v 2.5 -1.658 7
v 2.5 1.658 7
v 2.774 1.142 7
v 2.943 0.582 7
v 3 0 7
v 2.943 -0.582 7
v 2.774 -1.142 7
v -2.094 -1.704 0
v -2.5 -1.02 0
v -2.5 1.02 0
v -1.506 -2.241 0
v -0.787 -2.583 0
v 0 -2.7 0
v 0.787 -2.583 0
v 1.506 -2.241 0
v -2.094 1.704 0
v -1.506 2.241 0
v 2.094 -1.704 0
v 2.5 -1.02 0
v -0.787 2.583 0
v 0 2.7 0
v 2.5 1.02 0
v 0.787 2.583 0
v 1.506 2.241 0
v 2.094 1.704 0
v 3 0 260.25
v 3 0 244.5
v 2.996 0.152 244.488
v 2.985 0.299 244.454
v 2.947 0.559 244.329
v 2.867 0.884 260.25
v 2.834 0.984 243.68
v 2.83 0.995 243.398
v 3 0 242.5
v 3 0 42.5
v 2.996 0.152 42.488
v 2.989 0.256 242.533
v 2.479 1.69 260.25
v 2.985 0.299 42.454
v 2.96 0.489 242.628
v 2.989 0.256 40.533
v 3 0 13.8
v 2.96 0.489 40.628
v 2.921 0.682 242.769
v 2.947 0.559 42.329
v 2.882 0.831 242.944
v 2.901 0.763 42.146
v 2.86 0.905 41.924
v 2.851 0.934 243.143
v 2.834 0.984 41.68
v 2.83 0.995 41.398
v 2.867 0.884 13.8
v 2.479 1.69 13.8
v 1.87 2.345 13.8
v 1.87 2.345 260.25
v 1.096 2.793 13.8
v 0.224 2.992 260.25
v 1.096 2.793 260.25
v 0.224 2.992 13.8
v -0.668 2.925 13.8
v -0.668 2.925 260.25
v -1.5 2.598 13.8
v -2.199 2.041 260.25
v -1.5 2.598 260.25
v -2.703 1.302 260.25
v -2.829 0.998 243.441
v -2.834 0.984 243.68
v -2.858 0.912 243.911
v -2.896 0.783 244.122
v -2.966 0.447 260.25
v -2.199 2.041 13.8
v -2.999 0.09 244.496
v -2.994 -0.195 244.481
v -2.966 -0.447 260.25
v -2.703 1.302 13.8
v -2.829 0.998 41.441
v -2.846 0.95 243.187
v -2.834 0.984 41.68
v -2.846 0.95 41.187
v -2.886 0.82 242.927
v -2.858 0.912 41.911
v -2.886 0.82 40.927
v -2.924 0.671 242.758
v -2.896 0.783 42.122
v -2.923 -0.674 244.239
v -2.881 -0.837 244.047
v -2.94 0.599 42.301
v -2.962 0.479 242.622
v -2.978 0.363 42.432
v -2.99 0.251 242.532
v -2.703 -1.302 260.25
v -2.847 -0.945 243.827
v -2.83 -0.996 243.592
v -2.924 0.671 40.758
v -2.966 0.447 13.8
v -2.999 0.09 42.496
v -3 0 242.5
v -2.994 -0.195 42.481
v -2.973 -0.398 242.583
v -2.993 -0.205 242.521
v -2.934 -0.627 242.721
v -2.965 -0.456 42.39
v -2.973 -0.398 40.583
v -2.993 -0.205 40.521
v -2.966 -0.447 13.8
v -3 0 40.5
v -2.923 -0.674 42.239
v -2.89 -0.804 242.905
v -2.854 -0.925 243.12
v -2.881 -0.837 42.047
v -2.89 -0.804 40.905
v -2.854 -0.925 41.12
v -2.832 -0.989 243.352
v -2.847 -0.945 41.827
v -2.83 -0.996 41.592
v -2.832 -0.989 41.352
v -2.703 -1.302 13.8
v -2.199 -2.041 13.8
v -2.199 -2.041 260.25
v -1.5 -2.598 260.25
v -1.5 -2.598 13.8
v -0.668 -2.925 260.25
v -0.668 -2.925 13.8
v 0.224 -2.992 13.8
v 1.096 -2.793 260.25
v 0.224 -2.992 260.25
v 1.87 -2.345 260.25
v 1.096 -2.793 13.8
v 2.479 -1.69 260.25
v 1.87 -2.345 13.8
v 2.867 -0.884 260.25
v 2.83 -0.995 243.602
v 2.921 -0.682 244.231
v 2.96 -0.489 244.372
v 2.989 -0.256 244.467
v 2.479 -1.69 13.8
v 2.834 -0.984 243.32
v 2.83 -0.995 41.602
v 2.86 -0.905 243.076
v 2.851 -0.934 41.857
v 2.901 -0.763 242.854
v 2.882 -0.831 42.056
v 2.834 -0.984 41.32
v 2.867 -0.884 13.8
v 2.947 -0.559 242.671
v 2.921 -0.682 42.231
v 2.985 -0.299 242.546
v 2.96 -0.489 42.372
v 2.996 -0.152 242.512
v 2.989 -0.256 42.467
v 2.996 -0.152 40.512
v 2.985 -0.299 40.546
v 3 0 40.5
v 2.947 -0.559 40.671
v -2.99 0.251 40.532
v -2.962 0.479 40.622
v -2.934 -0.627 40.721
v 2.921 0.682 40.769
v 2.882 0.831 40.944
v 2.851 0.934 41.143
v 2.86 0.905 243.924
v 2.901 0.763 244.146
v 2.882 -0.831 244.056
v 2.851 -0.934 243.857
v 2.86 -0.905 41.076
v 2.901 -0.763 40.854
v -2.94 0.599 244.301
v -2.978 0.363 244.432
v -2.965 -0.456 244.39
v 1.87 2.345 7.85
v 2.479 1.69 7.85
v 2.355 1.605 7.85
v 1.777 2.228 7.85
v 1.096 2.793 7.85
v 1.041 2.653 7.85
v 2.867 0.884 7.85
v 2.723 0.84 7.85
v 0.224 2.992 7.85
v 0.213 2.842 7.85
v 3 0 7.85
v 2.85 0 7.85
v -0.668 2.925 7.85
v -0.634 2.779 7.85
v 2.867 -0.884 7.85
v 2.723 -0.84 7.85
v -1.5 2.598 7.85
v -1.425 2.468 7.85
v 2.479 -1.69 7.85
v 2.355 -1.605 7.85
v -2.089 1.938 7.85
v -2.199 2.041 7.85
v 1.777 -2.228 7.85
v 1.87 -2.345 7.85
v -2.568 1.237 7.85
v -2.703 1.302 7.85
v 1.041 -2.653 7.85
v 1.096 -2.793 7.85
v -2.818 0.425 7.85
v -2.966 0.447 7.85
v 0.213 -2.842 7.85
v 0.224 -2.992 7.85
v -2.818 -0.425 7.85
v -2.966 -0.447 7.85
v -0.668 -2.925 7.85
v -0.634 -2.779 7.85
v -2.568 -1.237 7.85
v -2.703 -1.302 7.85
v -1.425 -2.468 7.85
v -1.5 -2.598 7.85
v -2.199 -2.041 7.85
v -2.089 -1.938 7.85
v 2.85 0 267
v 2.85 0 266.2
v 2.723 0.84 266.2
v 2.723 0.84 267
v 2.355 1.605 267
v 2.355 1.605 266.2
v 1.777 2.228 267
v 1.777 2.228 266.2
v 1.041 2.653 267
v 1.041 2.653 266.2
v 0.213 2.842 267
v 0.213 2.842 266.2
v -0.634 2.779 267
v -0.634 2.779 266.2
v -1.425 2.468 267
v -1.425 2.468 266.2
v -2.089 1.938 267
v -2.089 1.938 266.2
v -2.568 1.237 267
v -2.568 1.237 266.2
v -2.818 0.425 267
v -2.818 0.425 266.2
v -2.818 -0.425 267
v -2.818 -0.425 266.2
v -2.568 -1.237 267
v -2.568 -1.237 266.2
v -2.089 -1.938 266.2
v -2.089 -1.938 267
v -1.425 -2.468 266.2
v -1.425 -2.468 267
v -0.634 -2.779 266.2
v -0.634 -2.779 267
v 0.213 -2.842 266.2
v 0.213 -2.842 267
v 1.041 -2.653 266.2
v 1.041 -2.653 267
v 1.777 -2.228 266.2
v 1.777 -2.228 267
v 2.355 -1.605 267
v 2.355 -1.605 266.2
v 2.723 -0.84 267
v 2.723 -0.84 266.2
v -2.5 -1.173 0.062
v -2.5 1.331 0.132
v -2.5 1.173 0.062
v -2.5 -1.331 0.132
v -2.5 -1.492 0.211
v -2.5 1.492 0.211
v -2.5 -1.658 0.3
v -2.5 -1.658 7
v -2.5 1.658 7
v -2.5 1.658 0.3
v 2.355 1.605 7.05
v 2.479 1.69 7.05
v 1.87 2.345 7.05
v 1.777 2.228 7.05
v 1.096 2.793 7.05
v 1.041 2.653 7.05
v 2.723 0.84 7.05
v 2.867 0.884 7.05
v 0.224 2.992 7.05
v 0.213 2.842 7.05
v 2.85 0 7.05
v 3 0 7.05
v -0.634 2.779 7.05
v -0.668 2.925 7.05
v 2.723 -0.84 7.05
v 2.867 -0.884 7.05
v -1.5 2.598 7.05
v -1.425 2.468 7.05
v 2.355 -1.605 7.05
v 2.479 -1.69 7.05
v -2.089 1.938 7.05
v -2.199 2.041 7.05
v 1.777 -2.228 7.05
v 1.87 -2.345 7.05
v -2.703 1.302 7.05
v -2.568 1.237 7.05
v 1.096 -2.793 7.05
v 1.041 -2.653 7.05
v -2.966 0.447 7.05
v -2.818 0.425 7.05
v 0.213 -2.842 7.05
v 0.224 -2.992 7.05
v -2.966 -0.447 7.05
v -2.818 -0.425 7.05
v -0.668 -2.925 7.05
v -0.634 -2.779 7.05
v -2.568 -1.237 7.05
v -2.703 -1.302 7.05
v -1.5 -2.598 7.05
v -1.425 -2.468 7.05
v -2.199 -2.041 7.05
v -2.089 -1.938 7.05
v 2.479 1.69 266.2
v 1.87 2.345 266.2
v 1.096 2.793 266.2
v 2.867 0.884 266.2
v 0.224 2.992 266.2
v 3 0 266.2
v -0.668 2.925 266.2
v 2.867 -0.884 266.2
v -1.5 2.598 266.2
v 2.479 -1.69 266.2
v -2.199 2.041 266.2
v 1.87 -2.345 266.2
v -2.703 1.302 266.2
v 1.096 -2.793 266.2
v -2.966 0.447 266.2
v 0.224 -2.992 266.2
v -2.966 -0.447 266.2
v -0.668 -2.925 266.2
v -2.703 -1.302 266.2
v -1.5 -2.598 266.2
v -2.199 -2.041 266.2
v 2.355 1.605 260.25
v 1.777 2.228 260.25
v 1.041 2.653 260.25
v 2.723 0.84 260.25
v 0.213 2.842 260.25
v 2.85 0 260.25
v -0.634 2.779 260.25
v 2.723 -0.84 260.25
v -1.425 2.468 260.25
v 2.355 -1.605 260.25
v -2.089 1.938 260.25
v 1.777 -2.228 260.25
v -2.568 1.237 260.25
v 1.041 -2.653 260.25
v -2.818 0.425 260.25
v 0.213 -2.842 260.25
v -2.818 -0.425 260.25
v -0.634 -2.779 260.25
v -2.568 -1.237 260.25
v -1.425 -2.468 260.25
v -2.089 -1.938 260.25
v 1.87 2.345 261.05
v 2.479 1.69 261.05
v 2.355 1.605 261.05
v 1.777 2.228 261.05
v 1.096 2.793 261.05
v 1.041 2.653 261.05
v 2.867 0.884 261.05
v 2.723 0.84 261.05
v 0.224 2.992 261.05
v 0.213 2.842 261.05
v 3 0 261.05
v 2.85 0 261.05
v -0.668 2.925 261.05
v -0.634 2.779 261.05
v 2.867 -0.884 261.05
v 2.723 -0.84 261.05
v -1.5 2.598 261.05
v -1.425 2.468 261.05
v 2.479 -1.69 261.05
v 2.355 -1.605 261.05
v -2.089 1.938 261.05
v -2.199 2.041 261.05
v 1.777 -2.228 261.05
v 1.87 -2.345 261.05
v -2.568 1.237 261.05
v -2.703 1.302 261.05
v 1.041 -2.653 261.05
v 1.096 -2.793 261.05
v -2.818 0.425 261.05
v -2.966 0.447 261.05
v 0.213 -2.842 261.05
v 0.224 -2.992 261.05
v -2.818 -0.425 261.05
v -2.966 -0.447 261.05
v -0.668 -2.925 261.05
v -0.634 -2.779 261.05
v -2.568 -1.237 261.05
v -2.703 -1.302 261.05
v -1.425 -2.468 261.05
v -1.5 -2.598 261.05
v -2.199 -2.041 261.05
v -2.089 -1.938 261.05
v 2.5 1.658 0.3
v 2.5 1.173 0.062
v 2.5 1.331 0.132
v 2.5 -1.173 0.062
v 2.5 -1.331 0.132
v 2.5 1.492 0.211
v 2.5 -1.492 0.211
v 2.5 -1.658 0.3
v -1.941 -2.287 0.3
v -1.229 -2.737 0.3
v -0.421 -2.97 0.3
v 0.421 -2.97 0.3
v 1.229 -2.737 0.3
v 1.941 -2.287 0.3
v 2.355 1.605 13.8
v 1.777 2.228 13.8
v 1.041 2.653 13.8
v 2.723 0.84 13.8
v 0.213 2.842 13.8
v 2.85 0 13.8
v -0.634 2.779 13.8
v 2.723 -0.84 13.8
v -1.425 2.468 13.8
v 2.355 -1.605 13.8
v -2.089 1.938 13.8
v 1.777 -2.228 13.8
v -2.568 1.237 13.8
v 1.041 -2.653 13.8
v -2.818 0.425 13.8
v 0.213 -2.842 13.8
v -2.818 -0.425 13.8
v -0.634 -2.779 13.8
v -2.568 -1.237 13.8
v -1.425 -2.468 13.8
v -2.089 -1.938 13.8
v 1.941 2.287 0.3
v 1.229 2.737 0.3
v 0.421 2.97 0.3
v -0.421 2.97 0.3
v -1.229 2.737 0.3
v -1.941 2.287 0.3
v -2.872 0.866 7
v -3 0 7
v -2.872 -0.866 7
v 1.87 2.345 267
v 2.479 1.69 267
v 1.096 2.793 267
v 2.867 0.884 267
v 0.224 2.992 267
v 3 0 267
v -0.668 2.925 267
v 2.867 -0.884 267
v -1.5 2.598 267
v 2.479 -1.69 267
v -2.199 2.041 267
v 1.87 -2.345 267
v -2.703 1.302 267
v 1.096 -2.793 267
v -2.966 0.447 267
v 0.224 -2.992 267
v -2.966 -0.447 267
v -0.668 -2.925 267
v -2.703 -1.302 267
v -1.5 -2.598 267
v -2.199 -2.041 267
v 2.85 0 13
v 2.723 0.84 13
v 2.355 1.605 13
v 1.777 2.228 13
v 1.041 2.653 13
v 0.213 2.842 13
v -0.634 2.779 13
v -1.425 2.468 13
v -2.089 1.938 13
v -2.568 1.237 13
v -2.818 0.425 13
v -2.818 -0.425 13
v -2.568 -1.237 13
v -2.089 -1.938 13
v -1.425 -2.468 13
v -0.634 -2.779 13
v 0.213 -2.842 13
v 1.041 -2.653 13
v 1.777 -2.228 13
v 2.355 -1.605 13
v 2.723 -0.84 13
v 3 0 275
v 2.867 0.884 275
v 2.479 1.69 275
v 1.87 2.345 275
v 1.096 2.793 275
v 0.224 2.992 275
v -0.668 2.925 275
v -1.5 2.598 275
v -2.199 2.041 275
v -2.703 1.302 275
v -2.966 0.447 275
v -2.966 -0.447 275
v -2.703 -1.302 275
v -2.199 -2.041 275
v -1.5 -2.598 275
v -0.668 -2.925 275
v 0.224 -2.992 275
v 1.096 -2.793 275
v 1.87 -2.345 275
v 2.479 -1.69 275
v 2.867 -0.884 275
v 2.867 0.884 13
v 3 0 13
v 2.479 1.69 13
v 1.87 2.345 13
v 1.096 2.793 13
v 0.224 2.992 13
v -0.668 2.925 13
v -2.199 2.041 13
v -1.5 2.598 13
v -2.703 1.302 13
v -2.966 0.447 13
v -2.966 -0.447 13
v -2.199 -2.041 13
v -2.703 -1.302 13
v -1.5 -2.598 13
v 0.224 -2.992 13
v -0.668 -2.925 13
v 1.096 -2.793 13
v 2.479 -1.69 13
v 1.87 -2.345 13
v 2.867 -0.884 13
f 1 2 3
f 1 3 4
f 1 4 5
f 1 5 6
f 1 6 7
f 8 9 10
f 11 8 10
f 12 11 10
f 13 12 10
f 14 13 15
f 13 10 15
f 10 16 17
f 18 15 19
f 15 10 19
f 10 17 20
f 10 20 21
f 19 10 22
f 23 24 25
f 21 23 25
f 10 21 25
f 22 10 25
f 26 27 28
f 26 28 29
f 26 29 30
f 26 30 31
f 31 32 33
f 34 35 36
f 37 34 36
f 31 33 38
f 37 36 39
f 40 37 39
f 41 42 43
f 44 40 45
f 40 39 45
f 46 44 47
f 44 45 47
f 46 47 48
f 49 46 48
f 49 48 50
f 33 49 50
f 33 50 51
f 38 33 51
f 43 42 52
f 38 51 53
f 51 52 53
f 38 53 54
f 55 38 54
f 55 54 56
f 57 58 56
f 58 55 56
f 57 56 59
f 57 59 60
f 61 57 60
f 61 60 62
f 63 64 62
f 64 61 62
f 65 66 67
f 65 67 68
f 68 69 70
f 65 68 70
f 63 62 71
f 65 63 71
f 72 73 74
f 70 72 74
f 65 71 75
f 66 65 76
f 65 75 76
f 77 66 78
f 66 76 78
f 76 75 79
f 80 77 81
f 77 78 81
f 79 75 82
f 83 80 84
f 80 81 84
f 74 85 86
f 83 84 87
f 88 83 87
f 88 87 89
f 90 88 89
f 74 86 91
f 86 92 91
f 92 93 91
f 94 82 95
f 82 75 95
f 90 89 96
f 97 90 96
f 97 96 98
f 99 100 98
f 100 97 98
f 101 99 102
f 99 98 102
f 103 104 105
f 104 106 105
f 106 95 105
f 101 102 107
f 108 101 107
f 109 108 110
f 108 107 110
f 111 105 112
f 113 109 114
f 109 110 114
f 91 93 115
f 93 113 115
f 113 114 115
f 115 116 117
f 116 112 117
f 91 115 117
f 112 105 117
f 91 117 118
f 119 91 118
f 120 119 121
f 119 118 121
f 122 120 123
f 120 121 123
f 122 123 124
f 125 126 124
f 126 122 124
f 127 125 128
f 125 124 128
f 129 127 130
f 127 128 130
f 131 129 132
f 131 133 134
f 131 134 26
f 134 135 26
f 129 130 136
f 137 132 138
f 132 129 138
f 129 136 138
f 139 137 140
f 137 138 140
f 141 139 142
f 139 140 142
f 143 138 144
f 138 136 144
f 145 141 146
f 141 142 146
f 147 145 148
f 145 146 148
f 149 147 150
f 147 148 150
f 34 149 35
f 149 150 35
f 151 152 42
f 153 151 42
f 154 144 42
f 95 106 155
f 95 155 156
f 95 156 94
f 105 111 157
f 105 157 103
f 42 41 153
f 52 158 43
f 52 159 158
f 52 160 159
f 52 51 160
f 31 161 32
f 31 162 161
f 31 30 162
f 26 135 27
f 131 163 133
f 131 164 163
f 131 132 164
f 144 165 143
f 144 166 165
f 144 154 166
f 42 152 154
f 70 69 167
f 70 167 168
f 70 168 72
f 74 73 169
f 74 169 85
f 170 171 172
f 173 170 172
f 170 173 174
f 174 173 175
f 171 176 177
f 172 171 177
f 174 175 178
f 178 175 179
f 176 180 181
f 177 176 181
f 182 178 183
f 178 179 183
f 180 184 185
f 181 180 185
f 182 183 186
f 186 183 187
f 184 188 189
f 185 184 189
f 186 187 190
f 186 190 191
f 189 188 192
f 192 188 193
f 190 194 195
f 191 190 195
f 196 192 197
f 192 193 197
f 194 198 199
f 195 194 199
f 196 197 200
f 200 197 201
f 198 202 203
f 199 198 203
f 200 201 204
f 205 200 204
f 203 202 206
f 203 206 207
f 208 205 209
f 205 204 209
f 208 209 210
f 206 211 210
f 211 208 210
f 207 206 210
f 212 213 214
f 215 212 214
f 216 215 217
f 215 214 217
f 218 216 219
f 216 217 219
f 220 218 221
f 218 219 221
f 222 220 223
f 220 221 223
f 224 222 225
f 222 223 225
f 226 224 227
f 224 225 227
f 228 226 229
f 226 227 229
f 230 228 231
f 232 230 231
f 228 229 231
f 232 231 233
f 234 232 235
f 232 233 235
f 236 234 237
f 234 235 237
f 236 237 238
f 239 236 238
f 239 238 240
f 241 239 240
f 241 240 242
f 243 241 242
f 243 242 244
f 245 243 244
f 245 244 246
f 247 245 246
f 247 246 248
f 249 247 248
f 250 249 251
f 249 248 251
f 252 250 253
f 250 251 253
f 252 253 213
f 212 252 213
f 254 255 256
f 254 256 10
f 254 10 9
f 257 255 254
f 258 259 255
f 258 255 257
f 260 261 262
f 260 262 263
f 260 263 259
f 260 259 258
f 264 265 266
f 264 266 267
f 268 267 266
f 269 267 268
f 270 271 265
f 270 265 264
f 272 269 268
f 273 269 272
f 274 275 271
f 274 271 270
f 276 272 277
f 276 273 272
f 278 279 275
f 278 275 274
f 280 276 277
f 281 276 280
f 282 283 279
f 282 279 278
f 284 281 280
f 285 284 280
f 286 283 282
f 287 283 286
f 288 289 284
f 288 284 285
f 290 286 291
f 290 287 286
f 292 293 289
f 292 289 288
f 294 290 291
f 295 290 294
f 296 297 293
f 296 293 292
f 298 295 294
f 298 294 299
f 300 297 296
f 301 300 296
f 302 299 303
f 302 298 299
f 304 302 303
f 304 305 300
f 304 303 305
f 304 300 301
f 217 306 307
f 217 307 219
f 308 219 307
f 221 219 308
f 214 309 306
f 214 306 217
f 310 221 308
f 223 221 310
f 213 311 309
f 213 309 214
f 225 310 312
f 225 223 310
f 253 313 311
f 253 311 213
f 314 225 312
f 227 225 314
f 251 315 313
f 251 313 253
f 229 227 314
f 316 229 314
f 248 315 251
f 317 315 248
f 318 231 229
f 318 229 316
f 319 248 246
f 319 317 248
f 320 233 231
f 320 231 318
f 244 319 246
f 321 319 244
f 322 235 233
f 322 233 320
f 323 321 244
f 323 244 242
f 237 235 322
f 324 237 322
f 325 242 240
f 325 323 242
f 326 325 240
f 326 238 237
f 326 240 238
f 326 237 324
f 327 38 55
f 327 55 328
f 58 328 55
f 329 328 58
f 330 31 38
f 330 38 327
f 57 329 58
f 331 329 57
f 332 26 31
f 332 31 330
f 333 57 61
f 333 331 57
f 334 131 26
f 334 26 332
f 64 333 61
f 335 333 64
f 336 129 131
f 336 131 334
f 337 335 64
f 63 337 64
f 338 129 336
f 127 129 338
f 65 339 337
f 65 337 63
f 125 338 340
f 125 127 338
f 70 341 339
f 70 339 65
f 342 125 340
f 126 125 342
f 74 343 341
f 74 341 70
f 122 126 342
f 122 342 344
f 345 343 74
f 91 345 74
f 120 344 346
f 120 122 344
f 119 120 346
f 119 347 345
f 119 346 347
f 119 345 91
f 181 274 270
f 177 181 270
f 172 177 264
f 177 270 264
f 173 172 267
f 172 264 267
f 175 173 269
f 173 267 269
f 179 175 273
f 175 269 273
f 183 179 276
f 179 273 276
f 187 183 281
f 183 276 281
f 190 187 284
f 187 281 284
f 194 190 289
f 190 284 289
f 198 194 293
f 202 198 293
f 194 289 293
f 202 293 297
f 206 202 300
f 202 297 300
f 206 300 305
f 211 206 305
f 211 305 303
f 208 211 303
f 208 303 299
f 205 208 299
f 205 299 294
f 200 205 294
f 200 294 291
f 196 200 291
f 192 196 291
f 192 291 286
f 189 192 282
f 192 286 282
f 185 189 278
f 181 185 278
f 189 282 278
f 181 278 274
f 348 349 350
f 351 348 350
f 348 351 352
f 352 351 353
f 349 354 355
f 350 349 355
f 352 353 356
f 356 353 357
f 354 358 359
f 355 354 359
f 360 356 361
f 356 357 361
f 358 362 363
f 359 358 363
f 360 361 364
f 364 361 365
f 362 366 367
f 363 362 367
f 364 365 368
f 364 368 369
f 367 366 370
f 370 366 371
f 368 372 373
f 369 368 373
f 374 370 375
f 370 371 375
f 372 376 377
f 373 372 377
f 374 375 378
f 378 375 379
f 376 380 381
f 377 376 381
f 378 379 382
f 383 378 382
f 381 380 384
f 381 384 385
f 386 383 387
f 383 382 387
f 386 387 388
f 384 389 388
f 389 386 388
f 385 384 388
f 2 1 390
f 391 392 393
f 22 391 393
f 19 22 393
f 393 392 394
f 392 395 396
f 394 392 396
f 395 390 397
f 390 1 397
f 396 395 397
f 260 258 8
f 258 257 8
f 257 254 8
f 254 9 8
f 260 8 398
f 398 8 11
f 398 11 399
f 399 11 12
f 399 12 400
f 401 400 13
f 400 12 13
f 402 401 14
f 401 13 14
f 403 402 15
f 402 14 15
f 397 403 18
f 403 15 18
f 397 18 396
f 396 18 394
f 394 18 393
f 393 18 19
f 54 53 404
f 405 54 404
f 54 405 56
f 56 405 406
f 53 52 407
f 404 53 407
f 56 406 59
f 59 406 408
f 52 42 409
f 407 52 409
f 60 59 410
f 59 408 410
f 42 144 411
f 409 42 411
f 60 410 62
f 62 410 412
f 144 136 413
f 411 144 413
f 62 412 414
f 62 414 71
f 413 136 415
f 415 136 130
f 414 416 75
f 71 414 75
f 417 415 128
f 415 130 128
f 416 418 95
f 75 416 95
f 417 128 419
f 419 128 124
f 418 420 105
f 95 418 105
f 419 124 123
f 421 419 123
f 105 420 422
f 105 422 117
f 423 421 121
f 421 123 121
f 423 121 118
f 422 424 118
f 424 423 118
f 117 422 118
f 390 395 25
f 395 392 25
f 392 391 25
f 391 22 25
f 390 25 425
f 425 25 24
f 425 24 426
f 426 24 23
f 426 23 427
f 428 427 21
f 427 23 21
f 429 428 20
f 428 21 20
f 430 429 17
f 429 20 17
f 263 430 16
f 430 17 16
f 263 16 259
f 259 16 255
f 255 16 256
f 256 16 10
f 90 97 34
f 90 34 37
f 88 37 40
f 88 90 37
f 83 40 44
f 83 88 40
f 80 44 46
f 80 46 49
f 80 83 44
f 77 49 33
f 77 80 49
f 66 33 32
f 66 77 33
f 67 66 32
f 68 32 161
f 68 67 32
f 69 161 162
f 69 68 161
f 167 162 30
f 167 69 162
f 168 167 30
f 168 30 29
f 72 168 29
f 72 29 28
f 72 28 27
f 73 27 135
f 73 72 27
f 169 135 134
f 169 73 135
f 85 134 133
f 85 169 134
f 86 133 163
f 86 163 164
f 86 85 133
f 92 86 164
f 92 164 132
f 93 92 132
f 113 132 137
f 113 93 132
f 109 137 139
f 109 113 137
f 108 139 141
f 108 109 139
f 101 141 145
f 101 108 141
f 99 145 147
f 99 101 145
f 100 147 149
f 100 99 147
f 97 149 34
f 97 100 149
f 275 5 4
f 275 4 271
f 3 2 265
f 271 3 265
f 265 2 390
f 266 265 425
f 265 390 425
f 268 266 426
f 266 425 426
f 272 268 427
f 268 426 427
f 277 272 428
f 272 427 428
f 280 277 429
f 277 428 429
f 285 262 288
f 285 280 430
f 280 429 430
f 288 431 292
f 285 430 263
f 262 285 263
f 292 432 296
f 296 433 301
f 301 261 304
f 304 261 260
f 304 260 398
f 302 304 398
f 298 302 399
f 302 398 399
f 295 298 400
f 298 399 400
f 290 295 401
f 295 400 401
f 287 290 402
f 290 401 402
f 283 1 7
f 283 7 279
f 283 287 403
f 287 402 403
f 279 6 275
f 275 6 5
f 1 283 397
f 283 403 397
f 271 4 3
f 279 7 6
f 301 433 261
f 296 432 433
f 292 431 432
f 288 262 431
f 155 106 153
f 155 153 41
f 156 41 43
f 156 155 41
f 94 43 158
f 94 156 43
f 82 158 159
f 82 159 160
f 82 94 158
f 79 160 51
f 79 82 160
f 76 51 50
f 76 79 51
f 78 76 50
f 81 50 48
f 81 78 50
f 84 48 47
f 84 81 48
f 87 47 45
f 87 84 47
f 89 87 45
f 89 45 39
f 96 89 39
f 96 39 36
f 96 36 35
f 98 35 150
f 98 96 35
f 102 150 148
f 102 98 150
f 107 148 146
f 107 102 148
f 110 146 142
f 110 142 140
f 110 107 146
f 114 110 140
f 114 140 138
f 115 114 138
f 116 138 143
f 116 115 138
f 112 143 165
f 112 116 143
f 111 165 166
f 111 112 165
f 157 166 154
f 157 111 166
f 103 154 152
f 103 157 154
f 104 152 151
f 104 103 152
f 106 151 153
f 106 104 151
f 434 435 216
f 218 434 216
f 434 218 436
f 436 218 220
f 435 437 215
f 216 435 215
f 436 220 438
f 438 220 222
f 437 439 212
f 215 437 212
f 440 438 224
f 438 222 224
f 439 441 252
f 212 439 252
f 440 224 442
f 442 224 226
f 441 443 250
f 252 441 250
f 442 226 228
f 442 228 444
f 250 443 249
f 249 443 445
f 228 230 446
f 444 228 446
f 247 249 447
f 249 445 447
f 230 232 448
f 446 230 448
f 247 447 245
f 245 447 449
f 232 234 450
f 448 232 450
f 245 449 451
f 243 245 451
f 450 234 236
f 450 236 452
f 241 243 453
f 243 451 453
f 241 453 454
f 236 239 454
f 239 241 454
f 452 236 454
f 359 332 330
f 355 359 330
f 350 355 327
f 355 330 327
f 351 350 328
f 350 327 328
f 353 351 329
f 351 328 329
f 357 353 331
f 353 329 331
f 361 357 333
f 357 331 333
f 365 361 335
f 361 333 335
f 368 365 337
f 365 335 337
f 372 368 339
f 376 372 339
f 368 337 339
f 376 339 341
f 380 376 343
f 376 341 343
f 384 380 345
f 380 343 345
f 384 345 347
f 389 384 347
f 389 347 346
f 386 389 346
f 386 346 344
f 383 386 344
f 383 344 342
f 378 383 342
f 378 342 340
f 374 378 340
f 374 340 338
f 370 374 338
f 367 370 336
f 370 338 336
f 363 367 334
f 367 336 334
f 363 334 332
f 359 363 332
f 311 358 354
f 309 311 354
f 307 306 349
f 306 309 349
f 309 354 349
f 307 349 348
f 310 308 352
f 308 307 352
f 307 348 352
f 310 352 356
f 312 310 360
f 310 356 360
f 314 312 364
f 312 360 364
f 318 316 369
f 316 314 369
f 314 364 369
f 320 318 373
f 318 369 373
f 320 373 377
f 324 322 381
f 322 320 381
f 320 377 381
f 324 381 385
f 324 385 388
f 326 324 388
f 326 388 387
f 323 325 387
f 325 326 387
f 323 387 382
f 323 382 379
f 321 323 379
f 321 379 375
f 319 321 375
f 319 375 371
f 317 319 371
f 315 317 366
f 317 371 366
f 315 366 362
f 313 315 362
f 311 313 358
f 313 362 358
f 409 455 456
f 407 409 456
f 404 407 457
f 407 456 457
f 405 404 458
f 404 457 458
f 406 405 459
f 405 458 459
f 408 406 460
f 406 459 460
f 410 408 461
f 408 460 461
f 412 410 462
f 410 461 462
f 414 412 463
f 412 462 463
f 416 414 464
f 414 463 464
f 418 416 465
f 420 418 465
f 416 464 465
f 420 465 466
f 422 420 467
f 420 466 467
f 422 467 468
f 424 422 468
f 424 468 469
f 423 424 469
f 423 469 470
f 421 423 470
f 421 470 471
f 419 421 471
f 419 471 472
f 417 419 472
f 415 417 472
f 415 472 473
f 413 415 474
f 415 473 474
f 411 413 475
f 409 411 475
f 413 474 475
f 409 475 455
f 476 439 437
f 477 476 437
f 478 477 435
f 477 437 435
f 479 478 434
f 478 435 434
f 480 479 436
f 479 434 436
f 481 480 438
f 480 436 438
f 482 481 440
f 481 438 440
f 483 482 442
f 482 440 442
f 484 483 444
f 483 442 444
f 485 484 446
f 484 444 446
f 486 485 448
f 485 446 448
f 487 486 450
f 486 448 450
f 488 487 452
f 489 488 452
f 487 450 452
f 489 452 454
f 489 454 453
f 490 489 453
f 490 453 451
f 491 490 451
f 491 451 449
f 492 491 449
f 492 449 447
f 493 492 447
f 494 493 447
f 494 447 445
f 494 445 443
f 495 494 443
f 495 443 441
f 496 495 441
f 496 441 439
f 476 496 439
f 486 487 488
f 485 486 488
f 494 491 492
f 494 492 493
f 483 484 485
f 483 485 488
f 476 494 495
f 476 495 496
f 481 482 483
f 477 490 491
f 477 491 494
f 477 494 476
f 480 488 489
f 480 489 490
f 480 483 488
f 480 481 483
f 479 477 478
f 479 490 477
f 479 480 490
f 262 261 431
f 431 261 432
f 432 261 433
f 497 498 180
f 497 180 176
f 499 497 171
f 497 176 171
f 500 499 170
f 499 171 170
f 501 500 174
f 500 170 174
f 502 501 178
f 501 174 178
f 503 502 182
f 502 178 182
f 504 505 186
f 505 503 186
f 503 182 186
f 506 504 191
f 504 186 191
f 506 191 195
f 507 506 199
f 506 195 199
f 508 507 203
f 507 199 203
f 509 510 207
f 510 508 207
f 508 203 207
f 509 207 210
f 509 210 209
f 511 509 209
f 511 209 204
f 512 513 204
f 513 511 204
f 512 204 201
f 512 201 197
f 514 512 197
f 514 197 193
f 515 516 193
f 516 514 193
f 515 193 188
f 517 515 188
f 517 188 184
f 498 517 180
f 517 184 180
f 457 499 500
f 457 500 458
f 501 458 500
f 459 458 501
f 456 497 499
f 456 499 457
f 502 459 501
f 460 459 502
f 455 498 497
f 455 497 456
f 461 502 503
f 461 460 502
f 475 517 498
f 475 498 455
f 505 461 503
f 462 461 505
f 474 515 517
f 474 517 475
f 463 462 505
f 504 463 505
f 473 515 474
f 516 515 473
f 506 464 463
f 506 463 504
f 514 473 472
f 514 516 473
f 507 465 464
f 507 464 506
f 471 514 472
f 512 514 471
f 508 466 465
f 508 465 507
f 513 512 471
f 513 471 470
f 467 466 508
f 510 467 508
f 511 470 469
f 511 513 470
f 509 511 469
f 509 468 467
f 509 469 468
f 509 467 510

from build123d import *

# Parameters (mm, degrees)
SKETCH1_R                       = 3
BOSS_EXTRUDE1_DEPTH             = 275
SKETCH3_W                       = 0.8
SKETCH3_H                       = 0.5
CUT_EXTRUDE2_DEPTH              = 276.032725326
CUT_EXTRUDE2_DEPTH_BACK         = 276.032725326
SKETCH4_W                       = 3.470061058
SKETCH4_H                       = 7
SKETCH4_W_2                     = 2.92528695
CHAMFER1_SIZE                   = 0.3
RETAINING_GROOVES_D5P7_1_START  = 7.05
SKETCH5_R                       = 2.85
SKETCH5_R_2                     = 2.49
RETAINING_GROOVES_D5P7_1_DEPTH  = 0.8
RETAINING_GROOVES_D5P7_2_START  = 13
SKETCH6_R                       = 2.85
SKETCH6_R_2                     = 2.49
RETAINING_GROOVES_D5P7_2_DEPTH  = 0.8
RETAINING_GROOVES_D5P7_3_START  = 260.25
SKETCH7_R                       = 2.85
SKETCH7_R_2                     = 2.49
RETAINING_GROOVES_D5P7_3_DEPTH  = 0.8
RETAINING_GROOVES_D5P7_4_START  = 266.2
SKETCH8_R                       = 2.85
SKETCH8_R_2                     = 2.49
RETAINING_GROOVES_D5P7_4_DEPTH  = 0.8
TWO_HUB_CROSS_PIN_D2_DEPTH      = 276.032725326
TWO_HUB_CROSS_PIN_D2_DEPTH_BACK = 276.032725326
SKETCH9_R                       = 1


with BuildPart() as part:
    # Sketch1 → Boss-Extrude1 (new body)
    with BuildSketch(Plane.XY):
        Circle(SKETCH1_R)
    extrude(amount=BOSS_EXTRUDE1_DEPTH)

    # Sketch3 → Cut-Revolve1 (revolve, cut)
    with BuildSketch(Plane(origin=(0, 0, 0), x_dir=(0, 0, -1), z_dir=(1, 0, 0)), mode=Mode.PRIVATE) as cut_revolve1_sk:
        with Locations((-266.6, 2.75)):
            Rectangle(SKETCH3_W, SKETCH3_H)
        with Locations((-260.65, 2.75)):
            Rectangle(SKETCH3_W, SKETCH3_H)
        with Locations((-13.4, 2.75)):
            Rectangle(SKETCH3_W, SKETCH3_H)
        with Locations((-7.45, 2.75)):
            Rectangle(SKETCH3_W, SKETCH3_H)
    revolve(cut_revolve1_sk.sketch.rotate(Axis((0, 0, 263.365004794), (0, 0, -1)), 90), axis=Axis((0, 0, 263.365004794), (0, 0, -1)), mode=Mode.SUBTRACT)

    # Sketch4 → Cut-Extrude2 (cut, two sides: drawn at the far end of the back side and taken through both)
    with BuildSketch(Plane(origin=(0, 0, 0), x_dir=(1, 0, 0), z_dir=(0, 1, 0)).offset(-CUT_EXTRUDE2_DEPTH_BACK)):
        with Locations((4.235030529, -3.5)):
            Rectangle(SKETCH4_W, SKETCH4_H)
        with Locations((-3.962643475, -3.5)):
            Rectangle(SKETCH4_W_2, SKETCH4_H)
    extrude(amount=CUT_EXTRUDE2_DEPTH + CUT_EXTRUDE2_DEPTH_BACK, mode=Mode.SUBTRACT)

    # Chamfer1
    chamfer1_edges = [part.edges().sort_by_distance(p)[0] for p in [
        (0, 3, 0),
        (0, -3, 0),
    ]]
    chamfer(chamfer1_edges, length=CHAMFER1_SIZE)

    # Sketch5 → Retaining_Grooves_D5p7_1 (add)
    with BuildSketch(Plane.XY.offset(RETAINING_GROOVES_D5P7_1_START)):
        Circle(SKETCH5_R)
        Circle(SKETCH5_R_2, mode=Mode.SUBTRACT)
    extrude(amount=RETAINING_GROOVES_D5P7_1_DEPTH)

    # Sketch6 → Retaining_Grooves_D5p7_2 (add)
    with BuildSketch(Plane.XY.offset(RETAINING_GROOVES_D5P7_2_START)):
        Circle(SKETCH6_R)
        Circle(SKETCH6_R_2, mode=Mode.SUBTRACT)
    extrude(amount=RETAINING_GROOVES_D5P7_2_DEPTH)

    # Sketch7 → Retaining_Grooves_D5p7_3 (add)
    with BuildSketch(Plane.XY.offset(RETAINING_GROOVES_D5P7_3_START)):
        Circle(SKETCH7_R)
        Circle(SKETCH7_R_2, mode=Mode.SUBTRACT)
    extrude(amount=RETAINING_GROOVES_D5P7_3_DEPTH)

    # Sketch8 → Retaining_Grooves_D5p7_4 (add)
    with BuildSketch(Plane.XY.offset(RETAINING_GROOVES_D5P7_4_START)):
        Circle(SKETCH8_R)
        Circle(SKETCH8_R_2, mode=Mode.SUBTRACT)
    extrude(amount=RETAINING_GROOVES_D5P7_4_DEPTH)

    # Sketch9 → Two_Hub_Cross_Pin_D2 (cut, two sides: drawn at the far end of the back side and taken through both)
    with BuildSketch(Plane(origin=(0, 0, 0), x_dir=(0, 0, -1), z_dir=(1, 0, 0)).offset(-TWO_HUB_CROSS_PIN_D2_DEPTH_BACK)):
        with Locations((-41.5, 0)):
            Circle(SKETCH9_R)
        with Locations((-243.5, 0)):
            Circle(SKETCH9_R)
    extrude(amount=TWO_HUB_CROSS_PIN_D2_DEPTH + TWO_HUB_CROSS_PIN_D2_DEPTH_BACK, mode=Mode.SUBTRACT)


solid = part.part
